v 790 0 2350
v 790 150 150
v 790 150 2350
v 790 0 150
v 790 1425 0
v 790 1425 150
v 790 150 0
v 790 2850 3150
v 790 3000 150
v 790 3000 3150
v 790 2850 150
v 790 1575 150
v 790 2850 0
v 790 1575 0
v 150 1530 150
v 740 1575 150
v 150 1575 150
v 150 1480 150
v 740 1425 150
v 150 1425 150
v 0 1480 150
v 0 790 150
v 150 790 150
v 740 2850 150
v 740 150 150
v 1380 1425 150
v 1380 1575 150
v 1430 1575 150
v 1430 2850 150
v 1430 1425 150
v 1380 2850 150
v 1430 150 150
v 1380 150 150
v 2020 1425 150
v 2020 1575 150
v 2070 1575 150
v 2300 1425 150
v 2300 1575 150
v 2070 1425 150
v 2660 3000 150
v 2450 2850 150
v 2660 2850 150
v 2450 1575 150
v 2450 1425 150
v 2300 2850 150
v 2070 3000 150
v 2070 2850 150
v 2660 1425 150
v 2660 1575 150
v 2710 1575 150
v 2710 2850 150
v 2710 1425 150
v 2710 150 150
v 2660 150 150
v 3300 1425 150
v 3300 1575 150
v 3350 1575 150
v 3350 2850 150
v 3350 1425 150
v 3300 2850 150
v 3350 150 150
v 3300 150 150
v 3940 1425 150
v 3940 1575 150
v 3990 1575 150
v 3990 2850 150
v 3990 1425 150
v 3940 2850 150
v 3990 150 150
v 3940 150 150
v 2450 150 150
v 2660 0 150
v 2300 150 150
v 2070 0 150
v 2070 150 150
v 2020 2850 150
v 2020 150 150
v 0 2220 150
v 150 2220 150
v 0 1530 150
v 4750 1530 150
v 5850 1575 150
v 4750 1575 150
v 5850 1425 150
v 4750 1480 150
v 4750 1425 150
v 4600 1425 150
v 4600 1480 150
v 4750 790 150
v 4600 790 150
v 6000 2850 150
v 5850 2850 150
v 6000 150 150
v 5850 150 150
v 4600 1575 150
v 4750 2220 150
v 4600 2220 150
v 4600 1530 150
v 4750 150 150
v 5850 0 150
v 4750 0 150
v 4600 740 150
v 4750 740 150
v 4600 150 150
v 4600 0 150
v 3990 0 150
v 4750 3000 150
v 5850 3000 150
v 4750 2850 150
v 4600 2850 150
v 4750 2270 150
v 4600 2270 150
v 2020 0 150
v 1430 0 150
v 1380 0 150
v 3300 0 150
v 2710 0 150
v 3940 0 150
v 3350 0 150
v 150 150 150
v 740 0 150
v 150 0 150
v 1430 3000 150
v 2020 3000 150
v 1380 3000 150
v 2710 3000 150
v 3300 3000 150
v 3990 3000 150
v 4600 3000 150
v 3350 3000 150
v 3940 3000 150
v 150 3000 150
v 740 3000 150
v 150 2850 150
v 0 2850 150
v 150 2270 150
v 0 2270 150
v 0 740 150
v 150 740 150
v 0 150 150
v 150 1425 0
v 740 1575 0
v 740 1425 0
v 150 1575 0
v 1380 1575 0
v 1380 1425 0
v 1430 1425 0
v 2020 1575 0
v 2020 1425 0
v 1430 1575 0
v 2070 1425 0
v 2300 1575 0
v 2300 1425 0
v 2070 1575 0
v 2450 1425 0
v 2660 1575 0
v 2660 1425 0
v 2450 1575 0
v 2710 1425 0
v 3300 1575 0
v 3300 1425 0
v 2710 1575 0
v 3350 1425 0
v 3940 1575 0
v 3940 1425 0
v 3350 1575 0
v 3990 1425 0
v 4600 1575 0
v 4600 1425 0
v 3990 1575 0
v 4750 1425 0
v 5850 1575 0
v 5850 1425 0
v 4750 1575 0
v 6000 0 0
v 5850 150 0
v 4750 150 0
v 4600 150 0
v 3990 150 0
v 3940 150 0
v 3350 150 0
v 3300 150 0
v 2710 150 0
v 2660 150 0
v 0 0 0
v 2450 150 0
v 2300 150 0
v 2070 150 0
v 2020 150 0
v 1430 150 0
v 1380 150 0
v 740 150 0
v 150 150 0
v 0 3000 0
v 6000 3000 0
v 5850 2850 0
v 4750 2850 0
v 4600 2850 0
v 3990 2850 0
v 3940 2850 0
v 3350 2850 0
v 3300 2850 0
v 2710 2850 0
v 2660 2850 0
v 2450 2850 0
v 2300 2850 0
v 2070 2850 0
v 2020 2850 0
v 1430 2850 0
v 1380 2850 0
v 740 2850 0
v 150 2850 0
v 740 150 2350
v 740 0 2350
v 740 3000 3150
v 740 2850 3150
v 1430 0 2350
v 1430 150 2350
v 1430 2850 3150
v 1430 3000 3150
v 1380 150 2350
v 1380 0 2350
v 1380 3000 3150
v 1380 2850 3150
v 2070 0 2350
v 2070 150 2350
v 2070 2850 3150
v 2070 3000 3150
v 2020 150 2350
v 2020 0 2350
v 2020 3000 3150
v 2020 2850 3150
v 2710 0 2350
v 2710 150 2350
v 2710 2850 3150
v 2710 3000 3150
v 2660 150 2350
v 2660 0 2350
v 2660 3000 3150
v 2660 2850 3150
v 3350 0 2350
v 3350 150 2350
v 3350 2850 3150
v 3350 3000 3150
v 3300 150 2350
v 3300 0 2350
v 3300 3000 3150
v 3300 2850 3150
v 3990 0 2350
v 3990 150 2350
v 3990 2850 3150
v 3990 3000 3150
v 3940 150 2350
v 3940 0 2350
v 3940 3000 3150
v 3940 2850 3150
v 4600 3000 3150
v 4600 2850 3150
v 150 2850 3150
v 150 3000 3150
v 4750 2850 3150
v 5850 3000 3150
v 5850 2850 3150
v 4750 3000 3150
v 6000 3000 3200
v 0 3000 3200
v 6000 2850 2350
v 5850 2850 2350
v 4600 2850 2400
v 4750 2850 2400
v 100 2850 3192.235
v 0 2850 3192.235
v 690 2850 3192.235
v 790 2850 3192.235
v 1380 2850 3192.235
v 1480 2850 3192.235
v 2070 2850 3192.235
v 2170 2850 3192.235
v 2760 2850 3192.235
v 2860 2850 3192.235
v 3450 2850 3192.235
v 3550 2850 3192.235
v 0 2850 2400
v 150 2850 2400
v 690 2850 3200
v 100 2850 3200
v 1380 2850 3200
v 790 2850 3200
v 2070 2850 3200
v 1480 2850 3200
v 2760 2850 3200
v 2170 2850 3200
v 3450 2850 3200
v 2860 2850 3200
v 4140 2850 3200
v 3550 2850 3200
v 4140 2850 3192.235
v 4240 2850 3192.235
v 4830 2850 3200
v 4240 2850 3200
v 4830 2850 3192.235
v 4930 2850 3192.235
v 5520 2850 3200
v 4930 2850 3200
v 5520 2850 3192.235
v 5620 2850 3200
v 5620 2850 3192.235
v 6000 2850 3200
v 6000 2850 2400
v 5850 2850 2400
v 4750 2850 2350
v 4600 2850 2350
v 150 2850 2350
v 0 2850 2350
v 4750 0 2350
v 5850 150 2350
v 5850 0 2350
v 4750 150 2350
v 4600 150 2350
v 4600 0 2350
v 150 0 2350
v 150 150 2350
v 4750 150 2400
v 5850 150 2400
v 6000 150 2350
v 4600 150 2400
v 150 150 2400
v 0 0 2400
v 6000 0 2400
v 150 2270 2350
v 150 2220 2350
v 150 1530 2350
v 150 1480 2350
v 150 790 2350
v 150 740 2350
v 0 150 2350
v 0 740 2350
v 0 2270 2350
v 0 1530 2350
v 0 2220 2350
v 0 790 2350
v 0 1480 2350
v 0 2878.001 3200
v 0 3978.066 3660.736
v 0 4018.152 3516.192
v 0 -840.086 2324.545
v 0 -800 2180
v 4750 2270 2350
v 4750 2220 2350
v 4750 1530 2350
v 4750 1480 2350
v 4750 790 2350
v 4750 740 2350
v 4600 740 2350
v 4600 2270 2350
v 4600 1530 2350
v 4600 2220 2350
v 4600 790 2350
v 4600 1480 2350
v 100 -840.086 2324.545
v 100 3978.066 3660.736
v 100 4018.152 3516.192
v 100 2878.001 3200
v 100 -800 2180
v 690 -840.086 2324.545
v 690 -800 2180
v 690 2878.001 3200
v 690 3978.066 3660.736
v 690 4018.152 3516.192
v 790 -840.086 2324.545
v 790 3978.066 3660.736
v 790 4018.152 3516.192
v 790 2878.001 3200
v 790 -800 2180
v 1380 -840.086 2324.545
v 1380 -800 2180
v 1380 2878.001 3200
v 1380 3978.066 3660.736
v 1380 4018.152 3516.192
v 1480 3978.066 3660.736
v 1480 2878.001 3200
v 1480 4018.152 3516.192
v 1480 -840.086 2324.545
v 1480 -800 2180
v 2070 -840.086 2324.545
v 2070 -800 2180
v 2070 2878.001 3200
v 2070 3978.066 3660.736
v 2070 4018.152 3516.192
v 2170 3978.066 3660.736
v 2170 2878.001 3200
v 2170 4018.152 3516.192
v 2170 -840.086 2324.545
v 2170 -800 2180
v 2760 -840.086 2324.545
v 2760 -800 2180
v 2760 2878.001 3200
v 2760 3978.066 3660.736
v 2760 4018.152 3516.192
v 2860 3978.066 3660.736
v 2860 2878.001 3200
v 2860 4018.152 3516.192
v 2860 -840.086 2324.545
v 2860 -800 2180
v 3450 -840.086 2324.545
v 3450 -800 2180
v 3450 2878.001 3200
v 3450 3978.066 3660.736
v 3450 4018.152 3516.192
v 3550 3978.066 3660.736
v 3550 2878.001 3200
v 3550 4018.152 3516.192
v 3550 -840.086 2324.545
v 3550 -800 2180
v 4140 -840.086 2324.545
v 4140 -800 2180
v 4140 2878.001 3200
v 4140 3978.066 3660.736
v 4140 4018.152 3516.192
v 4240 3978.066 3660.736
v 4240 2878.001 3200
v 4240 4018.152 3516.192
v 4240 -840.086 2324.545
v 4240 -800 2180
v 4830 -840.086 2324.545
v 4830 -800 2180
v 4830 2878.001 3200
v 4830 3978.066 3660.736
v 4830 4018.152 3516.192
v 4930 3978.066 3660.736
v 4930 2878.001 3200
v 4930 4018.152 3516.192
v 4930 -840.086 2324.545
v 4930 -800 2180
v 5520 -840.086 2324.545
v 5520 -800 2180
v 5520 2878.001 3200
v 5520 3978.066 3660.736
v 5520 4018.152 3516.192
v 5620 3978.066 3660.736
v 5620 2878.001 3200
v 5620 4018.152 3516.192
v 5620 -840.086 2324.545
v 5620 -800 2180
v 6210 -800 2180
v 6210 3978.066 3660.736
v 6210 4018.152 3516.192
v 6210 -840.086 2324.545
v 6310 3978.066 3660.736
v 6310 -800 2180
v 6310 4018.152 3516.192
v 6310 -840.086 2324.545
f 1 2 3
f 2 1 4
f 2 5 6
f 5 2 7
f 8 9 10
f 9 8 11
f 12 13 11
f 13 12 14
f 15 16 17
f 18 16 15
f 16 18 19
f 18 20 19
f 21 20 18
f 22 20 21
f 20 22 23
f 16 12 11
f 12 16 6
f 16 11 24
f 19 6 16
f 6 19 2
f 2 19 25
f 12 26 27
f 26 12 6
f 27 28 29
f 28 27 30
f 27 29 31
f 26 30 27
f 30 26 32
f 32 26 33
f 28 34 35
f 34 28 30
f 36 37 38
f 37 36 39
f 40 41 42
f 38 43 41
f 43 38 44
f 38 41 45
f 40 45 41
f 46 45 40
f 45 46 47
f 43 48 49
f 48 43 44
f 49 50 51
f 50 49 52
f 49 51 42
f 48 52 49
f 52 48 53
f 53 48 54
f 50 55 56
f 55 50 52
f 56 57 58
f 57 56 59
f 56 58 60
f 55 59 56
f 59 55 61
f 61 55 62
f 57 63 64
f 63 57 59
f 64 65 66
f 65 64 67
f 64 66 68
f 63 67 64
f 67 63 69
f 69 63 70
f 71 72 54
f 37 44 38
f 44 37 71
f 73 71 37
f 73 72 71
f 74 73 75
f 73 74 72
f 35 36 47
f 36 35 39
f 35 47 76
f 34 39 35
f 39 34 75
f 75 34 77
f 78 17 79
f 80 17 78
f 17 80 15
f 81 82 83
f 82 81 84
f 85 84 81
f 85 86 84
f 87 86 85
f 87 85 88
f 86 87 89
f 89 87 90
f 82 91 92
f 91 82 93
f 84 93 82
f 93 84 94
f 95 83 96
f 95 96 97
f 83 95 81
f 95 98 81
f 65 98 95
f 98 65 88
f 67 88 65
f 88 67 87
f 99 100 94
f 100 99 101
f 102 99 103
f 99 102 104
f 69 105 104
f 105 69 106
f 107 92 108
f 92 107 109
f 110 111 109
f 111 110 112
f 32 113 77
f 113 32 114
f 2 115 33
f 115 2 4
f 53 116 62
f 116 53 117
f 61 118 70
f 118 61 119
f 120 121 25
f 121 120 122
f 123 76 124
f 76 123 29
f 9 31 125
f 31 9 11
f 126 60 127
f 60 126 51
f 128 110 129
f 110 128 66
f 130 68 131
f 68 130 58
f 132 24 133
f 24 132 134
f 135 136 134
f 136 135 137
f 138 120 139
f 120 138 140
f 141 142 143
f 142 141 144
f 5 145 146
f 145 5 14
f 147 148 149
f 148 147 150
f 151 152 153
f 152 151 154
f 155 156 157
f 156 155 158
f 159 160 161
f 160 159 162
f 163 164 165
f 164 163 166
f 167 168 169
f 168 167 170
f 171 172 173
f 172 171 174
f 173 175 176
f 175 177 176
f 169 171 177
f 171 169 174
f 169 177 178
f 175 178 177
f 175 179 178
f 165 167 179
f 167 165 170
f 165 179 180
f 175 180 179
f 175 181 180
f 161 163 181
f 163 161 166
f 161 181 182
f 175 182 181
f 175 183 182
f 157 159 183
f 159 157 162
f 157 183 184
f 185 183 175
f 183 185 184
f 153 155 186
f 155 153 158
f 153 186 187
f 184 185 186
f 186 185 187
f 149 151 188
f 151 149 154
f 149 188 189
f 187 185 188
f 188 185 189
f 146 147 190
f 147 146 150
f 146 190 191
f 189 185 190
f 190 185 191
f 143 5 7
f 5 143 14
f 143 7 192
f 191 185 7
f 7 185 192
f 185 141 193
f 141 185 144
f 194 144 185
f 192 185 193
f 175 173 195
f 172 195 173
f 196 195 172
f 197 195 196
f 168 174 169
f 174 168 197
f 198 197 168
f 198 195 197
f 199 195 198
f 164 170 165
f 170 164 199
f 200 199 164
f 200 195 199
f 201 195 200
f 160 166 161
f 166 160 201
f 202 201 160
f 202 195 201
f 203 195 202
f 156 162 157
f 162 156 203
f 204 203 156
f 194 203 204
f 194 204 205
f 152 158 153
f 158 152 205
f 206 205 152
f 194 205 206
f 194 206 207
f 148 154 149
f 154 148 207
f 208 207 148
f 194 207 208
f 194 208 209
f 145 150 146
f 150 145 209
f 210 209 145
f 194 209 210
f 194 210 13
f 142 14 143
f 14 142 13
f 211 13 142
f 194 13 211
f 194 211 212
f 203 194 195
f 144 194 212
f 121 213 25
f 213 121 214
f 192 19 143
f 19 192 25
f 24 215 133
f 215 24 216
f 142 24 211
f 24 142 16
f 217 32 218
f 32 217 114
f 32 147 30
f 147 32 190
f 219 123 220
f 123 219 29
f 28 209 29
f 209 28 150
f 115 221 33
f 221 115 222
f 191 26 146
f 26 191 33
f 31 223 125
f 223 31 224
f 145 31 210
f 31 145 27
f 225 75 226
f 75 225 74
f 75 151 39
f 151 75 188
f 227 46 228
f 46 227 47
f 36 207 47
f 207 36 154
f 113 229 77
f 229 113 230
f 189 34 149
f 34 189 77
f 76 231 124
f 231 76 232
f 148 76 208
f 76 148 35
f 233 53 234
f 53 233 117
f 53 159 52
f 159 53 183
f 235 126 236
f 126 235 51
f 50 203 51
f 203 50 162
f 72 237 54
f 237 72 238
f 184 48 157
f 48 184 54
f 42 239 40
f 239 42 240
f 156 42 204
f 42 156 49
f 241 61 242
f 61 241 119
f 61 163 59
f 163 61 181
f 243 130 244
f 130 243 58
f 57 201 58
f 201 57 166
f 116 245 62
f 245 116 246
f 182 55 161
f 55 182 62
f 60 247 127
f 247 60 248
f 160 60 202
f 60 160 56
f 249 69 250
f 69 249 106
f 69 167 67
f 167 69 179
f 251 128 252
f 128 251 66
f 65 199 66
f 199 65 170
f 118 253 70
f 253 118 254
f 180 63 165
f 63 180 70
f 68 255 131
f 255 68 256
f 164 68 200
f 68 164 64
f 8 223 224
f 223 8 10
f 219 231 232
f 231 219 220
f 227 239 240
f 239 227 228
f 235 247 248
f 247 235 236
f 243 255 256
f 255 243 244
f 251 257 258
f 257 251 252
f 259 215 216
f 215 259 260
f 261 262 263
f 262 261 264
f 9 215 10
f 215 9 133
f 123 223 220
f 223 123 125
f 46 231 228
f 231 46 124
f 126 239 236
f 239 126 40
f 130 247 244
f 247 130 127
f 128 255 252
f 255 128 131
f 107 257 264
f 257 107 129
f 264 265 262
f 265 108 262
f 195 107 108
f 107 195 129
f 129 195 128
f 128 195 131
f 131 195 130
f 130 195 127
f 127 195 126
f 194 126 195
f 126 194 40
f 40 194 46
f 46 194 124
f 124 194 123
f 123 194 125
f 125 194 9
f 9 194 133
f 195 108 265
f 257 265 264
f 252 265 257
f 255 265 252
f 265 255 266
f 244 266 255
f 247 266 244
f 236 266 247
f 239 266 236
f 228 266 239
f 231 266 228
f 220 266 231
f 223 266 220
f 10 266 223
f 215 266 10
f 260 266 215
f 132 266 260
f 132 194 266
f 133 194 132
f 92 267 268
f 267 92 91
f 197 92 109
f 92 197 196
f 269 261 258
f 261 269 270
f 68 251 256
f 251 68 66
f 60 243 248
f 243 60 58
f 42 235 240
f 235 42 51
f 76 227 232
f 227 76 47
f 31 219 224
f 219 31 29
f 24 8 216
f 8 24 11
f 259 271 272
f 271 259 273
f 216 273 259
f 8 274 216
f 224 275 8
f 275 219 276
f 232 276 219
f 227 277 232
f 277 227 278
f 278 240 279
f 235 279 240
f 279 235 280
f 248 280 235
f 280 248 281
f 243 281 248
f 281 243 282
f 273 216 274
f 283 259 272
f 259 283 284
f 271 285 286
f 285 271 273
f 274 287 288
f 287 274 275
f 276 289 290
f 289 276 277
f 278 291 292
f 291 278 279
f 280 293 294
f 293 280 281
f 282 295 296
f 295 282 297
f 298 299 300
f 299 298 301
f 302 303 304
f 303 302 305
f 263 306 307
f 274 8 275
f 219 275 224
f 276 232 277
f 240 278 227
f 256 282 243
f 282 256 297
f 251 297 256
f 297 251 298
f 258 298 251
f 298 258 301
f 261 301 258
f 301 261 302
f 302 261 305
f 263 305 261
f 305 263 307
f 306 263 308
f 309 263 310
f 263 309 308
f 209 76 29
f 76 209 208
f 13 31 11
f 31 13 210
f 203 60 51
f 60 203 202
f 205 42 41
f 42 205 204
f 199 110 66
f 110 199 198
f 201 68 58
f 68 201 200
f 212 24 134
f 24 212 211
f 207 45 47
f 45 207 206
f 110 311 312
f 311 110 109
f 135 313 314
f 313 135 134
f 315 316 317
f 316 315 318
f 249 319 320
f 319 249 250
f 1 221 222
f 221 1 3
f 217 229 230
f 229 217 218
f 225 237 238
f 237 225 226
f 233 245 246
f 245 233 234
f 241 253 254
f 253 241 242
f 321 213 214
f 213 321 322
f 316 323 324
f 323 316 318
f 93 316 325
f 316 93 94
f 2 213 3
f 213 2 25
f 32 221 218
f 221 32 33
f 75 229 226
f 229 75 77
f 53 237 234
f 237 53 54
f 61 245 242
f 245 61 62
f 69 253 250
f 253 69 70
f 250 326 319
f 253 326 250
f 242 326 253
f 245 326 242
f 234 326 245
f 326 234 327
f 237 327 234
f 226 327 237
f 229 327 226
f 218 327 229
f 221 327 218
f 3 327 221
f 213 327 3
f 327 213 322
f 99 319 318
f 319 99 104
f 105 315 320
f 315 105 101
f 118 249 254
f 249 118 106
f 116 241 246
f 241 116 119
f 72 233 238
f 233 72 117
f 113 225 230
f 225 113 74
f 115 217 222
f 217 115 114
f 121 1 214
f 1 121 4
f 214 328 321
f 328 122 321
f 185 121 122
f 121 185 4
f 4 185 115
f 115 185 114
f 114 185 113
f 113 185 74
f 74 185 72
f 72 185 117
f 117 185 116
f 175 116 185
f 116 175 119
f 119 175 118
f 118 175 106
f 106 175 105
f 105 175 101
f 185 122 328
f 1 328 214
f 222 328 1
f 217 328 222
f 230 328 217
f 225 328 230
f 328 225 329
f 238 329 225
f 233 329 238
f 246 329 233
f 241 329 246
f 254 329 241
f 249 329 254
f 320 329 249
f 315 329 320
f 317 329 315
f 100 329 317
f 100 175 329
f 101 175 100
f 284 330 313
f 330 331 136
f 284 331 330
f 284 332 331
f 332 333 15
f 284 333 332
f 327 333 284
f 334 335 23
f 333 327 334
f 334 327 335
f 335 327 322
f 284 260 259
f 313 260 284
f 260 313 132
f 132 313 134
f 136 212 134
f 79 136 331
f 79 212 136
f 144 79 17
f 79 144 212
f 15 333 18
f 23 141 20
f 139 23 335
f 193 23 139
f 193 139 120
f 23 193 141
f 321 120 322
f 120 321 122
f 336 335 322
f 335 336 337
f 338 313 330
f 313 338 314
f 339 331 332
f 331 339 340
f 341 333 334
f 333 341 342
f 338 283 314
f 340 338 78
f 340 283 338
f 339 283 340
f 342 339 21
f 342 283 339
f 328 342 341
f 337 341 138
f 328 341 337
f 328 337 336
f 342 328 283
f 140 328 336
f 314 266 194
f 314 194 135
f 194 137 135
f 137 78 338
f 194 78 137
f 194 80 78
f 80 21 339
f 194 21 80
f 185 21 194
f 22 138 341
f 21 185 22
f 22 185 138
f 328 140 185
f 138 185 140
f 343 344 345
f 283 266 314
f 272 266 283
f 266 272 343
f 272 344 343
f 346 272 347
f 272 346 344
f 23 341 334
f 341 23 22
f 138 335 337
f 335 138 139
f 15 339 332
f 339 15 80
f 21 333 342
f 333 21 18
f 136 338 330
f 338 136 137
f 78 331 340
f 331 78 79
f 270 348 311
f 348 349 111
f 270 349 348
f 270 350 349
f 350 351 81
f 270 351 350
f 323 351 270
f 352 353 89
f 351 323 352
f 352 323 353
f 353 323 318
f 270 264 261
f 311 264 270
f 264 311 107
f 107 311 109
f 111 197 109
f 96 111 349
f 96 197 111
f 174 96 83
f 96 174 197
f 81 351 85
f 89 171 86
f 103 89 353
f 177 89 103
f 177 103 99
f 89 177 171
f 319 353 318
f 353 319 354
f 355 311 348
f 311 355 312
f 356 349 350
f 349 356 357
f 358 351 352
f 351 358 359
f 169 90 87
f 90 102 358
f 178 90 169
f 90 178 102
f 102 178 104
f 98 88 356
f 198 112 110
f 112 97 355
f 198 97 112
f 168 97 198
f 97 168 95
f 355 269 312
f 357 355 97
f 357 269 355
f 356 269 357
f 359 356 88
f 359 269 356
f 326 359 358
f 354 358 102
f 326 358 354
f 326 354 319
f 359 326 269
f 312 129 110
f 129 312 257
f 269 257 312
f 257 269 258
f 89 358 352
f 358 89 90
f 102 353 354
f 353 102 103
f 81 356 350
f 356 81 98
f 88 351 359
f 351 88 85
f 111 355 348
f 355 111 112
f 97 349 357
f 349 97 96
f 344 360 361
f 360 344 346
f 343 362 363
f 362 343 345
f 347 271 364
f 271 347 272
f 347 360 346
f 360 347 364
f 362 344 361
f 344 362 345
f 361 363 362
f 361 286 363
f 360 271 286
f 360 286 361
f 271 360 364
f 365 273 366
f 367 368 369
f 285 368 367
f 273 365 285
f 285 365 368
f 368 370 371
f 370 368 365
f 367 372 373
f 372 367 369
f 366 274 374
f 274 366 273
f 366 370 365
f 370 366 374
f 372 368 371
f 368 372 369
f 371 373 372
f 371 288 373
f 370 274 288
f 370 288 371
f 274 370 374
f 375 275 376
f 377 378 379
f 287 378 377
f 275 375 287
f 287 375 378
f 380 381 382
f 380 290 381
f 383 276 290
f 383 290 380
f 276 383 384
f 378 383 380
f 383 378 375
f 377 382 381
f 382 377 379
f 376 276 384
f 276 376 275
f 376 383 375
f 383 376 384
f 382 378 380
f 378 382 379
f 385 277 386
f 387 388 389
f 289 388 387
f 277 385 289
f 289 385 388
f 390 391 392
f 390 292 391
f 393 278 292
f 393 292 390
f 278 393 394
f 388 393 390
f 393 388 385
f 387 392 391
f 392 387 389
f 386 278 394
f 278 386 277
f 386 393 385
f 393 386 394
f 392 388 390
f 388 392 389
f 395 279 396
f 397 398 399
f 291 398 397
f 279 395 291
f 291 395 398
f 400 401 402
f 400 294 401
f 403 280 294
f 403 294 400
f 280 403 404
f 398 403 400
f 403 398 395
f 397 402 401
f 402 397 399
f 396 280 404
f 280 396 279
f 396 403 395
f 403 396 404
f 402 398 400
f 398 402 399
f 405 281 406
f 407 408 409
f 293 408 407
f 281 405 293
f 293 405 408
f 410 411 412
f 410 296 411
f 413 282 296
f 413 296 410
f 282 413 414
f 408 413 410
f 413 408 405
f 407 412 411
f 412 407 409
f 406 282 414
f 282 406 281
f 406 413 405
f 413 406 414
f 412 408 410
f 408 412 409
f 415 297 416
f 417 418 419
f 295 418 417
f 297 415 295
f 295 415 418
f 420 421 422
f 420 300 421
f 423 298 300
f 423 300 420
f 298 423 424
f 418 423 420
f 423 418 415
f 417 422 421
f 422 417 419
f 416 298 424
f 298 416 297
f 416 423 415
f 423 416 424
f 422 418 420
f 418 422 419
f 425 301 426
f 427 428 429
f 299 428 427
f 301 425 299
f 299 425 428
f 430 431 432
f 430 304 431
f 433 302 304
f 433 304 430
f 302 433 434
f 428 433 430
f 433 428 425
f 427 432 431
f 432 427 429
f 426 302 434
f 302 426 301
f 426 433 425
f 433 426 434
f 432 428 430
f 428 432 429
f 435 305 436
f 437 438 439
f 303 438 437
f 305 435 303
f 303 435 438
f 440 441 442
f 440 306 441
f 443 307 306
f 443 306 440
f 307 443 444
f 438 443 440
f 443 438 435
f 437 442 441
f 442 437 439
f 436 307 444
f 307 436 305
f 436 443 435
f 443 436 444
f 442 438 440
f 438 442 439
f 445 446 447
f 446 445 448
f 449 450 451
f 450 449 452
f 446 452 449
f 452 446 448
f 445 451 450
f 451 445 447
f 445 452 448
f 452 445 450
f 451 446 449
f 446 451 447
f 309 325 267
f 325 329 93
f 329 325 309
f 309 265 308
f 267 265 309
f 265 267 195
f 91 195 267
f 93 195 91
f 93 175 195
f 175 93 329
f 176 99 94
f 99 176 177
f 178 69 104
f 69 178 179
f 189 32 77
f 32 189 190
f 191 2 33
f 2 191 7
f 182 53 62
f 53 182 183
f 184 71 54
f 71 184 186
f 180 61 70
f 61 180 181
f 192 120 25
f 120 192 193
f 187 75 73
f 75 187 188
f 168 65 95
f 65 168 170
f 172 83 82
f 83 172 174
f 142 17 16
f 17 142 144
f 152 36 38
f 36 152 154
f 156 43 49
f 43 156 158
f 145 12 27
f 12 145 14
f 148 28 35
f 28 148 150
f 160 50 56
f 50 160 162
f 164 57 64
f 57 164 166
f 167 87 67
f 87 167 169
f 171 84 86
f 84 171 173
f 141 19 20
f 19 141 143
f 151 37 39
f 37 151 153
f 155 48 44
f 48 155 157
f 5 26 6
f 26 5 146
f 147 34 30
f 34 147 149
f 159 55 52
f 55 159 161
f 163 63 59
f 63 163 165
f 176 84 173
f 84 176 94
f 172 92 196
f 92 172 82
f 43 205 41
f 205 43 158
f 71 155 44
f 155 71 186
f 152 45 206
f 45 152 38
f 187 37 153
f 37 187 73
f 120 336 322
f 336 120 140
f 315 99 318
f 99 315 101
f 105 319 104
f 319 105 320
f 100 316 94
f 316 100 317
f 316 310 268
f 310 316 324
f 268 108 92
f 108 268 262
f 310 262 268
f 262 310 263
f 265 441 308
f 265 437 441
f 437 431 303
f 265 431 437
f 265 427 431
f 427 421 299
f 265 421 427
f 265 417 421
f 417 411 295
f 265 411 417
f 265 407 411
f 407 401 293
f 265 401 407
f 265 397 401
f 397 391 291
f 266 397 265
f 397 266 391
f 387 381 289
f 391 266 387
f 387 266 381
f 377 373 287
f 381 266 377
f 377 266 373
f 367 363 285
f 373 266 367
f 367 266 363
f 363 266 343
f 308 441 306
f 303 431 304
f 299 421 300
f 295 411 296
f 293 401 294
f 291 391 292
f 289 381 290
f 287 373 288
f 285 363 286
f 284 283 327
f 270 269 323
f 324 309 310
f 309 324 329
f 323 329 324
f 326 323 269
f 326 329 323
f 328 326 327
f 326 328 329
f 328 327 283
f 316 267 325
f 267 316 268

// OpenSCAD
global_width = 6000;
global_depth = 3000;

main_timber_w = 150;
main_timber_h = 150;

sec_timber_w = 50;
sec_timber_h = 150;

roof_timber_w = 100;
roof_timber_h = 150; 

wall_height1 = 2200;
wall_height2 = 3000;

balk_step = 590;

log_place_width = 1250;

// floor
translate([0,0,0]) {
    cube([
        global_width, 
        main_timber_w, 
        main_timber_h
    ]);
}

translate([0,global_depth/2 - main_timber_w/2,0]) {
    cube([
        global_width, 
        main_timber_w, 
        main_timber_h
    ]);
}


translate([0,global_depth - main_timber_w,0]) {
    cube([
        global_width, 
        main_timber_w, 
        main_timber_h
    ]);
}


translate([global_width - main_timber_w, main_timber_h,0]) {
    cube([
        main_timber_w, 
        global_depth - 2 * main_timber_w,
        main_timber_h
    ]);
}

translate([global_width - main_timber_w - log_place_width, main_timber_h,0]) {
    cube([
        main_timber_w, 
        global_depth - 2 * main_timber_w,
        main_timber_h
    ]);
}

translate([(global_width - log_place_width - main_timber_w)/2, main_timber_h,0]) {
    cube([
        main_timber_w, 
        global_depth - 2 * main_timber_w,
        main_timber_h
    ]);
}

translate([0, main_timber_h,0]) {
    cube([
        main_timber_w, 
        global_depth - 2 * main_timber_w,
        main_timber_h
    ]);
}

for (i = [1:6]){    
    x = main_timber_w + balk_step * i + sec_timber_w * (i - 1);
    translate([x, sec_timber_w, 0]){
        cube([
            sec_timber_w, 
            global_depth - 2 * sec_timber_w, 
            sec_timber_h
        ]);
    }
   
}

//corner columns
translate([0, 0, main_timber_h]) {
    cube([
        main_timber_w, 
        main_timber_h,
        wall_height1
    ]);
}

translate([global_width - main_timber_w - log_place_width, 0,main_timber_h]) {
    cube([
        main_timber_w, 
        main_timber_h,
        wall_height1
    ]);
}

translate([global_width - main_timber_w, 0,main_timber_h]) {
    cube([
        main_timber_w, 
        main_timber_h,
        wall_height1
    ]);
}

translate([0, global_depth - main_timber_w ,main_timber_h]) {
    cube([
        main_timber_w, 
        main_timber_h,
        wall_height2
    ]);
}

translate([global_width - main_timber_w - log_place_width, global_depth - main_timber_w,main_timber_h]) {
    cube([
        main_timber_w, 
        main_timber_h,
        wall_height2
    ]);
}

translate([global_width - main_timber_w, global_depth - main_timber_w,main_timber_h]) {
    cube([
        main_timber_w, 
        main_timber_h,
        wall_height2
    ]);
}


//tall wall
for (i = [1:6]){
    x = (i*balk_step + (i-1)*sec_timber_w + main_timber_w);
    translate([x, global_depth - sec_timber_h, main_timber_h]){
        cube([
            sec_timber_w,
            sec_timber_h,
            wall_height2
        ]);
    }
}

translate([0,global_depth - sec_timber_h ,wall_height2 + main_timber_h]) {
    cube([
        global_width, 
        sec_timber_h, 
        sec_timber_w
    ]);
}


//short wall
for (i = [1:6]){
    x = (i*balk_step + (i-1)*sec_timber_w + main_timber_w);
    translate([x, 0, sec_timber_h]){
        cube([
            sec_timber_w,
            sec_timber_h, 
            wall_height1
        ]);
    }
}


translate([0, 0, wall_height1 + main_timber_h]) {
    cube([
        global_width, 
        sec_timber_h, 
        sec_timber_w
    ]);
}

//side wall
for (i = [1:3]){
    y = (i*balk_step + i*sec_timber_h);
    translate([0, y, main_timber_h]) {
            cube([
                sec_timber_h,            
                sec_timber_w,
                wall_height1
            ]);
    }
}

translate([0,0 ,wall_height1 + main_timber_h]) {
    cube([
        sec_timber_h, 
        global_depth,
        sec_timber_w
    ]);
}

//side wall
for (i = [1:3]){
    y = (i*balk_step + i*sec_timber_h  );
    translate([global_width - log_place_width - main_timber_w, y, main_timber_h]) {
            cube([
                sec_timber_h,            
                sec_timber_w,
                wall_height1
            ]);
    }
}

translate([global_width - main_timber_w, 0 ,wall_height1 + main_timber_h]) {
    cube([
        sec_timber_h, 
        global_depth,
        sec_timber_w
    ]);
}

translate([global_width - main_timber_w - log_place_width, 0 ,wall_height1 + main_timber_h]) {
    cube([
        sec_timber_h, 
        global_depth,
        sec_timber_w
    ]);
}

//roof

for (i = [0:9]){    
    x = balk_step * i + roof_timber_w * i;
    translate([x, -800, 2180]){
        rotate([15.5,0,0]) {
        cube([
            roof_timber_w, 
            5000, 
            roof_timber_h
        ]);
    }
}
   
}
